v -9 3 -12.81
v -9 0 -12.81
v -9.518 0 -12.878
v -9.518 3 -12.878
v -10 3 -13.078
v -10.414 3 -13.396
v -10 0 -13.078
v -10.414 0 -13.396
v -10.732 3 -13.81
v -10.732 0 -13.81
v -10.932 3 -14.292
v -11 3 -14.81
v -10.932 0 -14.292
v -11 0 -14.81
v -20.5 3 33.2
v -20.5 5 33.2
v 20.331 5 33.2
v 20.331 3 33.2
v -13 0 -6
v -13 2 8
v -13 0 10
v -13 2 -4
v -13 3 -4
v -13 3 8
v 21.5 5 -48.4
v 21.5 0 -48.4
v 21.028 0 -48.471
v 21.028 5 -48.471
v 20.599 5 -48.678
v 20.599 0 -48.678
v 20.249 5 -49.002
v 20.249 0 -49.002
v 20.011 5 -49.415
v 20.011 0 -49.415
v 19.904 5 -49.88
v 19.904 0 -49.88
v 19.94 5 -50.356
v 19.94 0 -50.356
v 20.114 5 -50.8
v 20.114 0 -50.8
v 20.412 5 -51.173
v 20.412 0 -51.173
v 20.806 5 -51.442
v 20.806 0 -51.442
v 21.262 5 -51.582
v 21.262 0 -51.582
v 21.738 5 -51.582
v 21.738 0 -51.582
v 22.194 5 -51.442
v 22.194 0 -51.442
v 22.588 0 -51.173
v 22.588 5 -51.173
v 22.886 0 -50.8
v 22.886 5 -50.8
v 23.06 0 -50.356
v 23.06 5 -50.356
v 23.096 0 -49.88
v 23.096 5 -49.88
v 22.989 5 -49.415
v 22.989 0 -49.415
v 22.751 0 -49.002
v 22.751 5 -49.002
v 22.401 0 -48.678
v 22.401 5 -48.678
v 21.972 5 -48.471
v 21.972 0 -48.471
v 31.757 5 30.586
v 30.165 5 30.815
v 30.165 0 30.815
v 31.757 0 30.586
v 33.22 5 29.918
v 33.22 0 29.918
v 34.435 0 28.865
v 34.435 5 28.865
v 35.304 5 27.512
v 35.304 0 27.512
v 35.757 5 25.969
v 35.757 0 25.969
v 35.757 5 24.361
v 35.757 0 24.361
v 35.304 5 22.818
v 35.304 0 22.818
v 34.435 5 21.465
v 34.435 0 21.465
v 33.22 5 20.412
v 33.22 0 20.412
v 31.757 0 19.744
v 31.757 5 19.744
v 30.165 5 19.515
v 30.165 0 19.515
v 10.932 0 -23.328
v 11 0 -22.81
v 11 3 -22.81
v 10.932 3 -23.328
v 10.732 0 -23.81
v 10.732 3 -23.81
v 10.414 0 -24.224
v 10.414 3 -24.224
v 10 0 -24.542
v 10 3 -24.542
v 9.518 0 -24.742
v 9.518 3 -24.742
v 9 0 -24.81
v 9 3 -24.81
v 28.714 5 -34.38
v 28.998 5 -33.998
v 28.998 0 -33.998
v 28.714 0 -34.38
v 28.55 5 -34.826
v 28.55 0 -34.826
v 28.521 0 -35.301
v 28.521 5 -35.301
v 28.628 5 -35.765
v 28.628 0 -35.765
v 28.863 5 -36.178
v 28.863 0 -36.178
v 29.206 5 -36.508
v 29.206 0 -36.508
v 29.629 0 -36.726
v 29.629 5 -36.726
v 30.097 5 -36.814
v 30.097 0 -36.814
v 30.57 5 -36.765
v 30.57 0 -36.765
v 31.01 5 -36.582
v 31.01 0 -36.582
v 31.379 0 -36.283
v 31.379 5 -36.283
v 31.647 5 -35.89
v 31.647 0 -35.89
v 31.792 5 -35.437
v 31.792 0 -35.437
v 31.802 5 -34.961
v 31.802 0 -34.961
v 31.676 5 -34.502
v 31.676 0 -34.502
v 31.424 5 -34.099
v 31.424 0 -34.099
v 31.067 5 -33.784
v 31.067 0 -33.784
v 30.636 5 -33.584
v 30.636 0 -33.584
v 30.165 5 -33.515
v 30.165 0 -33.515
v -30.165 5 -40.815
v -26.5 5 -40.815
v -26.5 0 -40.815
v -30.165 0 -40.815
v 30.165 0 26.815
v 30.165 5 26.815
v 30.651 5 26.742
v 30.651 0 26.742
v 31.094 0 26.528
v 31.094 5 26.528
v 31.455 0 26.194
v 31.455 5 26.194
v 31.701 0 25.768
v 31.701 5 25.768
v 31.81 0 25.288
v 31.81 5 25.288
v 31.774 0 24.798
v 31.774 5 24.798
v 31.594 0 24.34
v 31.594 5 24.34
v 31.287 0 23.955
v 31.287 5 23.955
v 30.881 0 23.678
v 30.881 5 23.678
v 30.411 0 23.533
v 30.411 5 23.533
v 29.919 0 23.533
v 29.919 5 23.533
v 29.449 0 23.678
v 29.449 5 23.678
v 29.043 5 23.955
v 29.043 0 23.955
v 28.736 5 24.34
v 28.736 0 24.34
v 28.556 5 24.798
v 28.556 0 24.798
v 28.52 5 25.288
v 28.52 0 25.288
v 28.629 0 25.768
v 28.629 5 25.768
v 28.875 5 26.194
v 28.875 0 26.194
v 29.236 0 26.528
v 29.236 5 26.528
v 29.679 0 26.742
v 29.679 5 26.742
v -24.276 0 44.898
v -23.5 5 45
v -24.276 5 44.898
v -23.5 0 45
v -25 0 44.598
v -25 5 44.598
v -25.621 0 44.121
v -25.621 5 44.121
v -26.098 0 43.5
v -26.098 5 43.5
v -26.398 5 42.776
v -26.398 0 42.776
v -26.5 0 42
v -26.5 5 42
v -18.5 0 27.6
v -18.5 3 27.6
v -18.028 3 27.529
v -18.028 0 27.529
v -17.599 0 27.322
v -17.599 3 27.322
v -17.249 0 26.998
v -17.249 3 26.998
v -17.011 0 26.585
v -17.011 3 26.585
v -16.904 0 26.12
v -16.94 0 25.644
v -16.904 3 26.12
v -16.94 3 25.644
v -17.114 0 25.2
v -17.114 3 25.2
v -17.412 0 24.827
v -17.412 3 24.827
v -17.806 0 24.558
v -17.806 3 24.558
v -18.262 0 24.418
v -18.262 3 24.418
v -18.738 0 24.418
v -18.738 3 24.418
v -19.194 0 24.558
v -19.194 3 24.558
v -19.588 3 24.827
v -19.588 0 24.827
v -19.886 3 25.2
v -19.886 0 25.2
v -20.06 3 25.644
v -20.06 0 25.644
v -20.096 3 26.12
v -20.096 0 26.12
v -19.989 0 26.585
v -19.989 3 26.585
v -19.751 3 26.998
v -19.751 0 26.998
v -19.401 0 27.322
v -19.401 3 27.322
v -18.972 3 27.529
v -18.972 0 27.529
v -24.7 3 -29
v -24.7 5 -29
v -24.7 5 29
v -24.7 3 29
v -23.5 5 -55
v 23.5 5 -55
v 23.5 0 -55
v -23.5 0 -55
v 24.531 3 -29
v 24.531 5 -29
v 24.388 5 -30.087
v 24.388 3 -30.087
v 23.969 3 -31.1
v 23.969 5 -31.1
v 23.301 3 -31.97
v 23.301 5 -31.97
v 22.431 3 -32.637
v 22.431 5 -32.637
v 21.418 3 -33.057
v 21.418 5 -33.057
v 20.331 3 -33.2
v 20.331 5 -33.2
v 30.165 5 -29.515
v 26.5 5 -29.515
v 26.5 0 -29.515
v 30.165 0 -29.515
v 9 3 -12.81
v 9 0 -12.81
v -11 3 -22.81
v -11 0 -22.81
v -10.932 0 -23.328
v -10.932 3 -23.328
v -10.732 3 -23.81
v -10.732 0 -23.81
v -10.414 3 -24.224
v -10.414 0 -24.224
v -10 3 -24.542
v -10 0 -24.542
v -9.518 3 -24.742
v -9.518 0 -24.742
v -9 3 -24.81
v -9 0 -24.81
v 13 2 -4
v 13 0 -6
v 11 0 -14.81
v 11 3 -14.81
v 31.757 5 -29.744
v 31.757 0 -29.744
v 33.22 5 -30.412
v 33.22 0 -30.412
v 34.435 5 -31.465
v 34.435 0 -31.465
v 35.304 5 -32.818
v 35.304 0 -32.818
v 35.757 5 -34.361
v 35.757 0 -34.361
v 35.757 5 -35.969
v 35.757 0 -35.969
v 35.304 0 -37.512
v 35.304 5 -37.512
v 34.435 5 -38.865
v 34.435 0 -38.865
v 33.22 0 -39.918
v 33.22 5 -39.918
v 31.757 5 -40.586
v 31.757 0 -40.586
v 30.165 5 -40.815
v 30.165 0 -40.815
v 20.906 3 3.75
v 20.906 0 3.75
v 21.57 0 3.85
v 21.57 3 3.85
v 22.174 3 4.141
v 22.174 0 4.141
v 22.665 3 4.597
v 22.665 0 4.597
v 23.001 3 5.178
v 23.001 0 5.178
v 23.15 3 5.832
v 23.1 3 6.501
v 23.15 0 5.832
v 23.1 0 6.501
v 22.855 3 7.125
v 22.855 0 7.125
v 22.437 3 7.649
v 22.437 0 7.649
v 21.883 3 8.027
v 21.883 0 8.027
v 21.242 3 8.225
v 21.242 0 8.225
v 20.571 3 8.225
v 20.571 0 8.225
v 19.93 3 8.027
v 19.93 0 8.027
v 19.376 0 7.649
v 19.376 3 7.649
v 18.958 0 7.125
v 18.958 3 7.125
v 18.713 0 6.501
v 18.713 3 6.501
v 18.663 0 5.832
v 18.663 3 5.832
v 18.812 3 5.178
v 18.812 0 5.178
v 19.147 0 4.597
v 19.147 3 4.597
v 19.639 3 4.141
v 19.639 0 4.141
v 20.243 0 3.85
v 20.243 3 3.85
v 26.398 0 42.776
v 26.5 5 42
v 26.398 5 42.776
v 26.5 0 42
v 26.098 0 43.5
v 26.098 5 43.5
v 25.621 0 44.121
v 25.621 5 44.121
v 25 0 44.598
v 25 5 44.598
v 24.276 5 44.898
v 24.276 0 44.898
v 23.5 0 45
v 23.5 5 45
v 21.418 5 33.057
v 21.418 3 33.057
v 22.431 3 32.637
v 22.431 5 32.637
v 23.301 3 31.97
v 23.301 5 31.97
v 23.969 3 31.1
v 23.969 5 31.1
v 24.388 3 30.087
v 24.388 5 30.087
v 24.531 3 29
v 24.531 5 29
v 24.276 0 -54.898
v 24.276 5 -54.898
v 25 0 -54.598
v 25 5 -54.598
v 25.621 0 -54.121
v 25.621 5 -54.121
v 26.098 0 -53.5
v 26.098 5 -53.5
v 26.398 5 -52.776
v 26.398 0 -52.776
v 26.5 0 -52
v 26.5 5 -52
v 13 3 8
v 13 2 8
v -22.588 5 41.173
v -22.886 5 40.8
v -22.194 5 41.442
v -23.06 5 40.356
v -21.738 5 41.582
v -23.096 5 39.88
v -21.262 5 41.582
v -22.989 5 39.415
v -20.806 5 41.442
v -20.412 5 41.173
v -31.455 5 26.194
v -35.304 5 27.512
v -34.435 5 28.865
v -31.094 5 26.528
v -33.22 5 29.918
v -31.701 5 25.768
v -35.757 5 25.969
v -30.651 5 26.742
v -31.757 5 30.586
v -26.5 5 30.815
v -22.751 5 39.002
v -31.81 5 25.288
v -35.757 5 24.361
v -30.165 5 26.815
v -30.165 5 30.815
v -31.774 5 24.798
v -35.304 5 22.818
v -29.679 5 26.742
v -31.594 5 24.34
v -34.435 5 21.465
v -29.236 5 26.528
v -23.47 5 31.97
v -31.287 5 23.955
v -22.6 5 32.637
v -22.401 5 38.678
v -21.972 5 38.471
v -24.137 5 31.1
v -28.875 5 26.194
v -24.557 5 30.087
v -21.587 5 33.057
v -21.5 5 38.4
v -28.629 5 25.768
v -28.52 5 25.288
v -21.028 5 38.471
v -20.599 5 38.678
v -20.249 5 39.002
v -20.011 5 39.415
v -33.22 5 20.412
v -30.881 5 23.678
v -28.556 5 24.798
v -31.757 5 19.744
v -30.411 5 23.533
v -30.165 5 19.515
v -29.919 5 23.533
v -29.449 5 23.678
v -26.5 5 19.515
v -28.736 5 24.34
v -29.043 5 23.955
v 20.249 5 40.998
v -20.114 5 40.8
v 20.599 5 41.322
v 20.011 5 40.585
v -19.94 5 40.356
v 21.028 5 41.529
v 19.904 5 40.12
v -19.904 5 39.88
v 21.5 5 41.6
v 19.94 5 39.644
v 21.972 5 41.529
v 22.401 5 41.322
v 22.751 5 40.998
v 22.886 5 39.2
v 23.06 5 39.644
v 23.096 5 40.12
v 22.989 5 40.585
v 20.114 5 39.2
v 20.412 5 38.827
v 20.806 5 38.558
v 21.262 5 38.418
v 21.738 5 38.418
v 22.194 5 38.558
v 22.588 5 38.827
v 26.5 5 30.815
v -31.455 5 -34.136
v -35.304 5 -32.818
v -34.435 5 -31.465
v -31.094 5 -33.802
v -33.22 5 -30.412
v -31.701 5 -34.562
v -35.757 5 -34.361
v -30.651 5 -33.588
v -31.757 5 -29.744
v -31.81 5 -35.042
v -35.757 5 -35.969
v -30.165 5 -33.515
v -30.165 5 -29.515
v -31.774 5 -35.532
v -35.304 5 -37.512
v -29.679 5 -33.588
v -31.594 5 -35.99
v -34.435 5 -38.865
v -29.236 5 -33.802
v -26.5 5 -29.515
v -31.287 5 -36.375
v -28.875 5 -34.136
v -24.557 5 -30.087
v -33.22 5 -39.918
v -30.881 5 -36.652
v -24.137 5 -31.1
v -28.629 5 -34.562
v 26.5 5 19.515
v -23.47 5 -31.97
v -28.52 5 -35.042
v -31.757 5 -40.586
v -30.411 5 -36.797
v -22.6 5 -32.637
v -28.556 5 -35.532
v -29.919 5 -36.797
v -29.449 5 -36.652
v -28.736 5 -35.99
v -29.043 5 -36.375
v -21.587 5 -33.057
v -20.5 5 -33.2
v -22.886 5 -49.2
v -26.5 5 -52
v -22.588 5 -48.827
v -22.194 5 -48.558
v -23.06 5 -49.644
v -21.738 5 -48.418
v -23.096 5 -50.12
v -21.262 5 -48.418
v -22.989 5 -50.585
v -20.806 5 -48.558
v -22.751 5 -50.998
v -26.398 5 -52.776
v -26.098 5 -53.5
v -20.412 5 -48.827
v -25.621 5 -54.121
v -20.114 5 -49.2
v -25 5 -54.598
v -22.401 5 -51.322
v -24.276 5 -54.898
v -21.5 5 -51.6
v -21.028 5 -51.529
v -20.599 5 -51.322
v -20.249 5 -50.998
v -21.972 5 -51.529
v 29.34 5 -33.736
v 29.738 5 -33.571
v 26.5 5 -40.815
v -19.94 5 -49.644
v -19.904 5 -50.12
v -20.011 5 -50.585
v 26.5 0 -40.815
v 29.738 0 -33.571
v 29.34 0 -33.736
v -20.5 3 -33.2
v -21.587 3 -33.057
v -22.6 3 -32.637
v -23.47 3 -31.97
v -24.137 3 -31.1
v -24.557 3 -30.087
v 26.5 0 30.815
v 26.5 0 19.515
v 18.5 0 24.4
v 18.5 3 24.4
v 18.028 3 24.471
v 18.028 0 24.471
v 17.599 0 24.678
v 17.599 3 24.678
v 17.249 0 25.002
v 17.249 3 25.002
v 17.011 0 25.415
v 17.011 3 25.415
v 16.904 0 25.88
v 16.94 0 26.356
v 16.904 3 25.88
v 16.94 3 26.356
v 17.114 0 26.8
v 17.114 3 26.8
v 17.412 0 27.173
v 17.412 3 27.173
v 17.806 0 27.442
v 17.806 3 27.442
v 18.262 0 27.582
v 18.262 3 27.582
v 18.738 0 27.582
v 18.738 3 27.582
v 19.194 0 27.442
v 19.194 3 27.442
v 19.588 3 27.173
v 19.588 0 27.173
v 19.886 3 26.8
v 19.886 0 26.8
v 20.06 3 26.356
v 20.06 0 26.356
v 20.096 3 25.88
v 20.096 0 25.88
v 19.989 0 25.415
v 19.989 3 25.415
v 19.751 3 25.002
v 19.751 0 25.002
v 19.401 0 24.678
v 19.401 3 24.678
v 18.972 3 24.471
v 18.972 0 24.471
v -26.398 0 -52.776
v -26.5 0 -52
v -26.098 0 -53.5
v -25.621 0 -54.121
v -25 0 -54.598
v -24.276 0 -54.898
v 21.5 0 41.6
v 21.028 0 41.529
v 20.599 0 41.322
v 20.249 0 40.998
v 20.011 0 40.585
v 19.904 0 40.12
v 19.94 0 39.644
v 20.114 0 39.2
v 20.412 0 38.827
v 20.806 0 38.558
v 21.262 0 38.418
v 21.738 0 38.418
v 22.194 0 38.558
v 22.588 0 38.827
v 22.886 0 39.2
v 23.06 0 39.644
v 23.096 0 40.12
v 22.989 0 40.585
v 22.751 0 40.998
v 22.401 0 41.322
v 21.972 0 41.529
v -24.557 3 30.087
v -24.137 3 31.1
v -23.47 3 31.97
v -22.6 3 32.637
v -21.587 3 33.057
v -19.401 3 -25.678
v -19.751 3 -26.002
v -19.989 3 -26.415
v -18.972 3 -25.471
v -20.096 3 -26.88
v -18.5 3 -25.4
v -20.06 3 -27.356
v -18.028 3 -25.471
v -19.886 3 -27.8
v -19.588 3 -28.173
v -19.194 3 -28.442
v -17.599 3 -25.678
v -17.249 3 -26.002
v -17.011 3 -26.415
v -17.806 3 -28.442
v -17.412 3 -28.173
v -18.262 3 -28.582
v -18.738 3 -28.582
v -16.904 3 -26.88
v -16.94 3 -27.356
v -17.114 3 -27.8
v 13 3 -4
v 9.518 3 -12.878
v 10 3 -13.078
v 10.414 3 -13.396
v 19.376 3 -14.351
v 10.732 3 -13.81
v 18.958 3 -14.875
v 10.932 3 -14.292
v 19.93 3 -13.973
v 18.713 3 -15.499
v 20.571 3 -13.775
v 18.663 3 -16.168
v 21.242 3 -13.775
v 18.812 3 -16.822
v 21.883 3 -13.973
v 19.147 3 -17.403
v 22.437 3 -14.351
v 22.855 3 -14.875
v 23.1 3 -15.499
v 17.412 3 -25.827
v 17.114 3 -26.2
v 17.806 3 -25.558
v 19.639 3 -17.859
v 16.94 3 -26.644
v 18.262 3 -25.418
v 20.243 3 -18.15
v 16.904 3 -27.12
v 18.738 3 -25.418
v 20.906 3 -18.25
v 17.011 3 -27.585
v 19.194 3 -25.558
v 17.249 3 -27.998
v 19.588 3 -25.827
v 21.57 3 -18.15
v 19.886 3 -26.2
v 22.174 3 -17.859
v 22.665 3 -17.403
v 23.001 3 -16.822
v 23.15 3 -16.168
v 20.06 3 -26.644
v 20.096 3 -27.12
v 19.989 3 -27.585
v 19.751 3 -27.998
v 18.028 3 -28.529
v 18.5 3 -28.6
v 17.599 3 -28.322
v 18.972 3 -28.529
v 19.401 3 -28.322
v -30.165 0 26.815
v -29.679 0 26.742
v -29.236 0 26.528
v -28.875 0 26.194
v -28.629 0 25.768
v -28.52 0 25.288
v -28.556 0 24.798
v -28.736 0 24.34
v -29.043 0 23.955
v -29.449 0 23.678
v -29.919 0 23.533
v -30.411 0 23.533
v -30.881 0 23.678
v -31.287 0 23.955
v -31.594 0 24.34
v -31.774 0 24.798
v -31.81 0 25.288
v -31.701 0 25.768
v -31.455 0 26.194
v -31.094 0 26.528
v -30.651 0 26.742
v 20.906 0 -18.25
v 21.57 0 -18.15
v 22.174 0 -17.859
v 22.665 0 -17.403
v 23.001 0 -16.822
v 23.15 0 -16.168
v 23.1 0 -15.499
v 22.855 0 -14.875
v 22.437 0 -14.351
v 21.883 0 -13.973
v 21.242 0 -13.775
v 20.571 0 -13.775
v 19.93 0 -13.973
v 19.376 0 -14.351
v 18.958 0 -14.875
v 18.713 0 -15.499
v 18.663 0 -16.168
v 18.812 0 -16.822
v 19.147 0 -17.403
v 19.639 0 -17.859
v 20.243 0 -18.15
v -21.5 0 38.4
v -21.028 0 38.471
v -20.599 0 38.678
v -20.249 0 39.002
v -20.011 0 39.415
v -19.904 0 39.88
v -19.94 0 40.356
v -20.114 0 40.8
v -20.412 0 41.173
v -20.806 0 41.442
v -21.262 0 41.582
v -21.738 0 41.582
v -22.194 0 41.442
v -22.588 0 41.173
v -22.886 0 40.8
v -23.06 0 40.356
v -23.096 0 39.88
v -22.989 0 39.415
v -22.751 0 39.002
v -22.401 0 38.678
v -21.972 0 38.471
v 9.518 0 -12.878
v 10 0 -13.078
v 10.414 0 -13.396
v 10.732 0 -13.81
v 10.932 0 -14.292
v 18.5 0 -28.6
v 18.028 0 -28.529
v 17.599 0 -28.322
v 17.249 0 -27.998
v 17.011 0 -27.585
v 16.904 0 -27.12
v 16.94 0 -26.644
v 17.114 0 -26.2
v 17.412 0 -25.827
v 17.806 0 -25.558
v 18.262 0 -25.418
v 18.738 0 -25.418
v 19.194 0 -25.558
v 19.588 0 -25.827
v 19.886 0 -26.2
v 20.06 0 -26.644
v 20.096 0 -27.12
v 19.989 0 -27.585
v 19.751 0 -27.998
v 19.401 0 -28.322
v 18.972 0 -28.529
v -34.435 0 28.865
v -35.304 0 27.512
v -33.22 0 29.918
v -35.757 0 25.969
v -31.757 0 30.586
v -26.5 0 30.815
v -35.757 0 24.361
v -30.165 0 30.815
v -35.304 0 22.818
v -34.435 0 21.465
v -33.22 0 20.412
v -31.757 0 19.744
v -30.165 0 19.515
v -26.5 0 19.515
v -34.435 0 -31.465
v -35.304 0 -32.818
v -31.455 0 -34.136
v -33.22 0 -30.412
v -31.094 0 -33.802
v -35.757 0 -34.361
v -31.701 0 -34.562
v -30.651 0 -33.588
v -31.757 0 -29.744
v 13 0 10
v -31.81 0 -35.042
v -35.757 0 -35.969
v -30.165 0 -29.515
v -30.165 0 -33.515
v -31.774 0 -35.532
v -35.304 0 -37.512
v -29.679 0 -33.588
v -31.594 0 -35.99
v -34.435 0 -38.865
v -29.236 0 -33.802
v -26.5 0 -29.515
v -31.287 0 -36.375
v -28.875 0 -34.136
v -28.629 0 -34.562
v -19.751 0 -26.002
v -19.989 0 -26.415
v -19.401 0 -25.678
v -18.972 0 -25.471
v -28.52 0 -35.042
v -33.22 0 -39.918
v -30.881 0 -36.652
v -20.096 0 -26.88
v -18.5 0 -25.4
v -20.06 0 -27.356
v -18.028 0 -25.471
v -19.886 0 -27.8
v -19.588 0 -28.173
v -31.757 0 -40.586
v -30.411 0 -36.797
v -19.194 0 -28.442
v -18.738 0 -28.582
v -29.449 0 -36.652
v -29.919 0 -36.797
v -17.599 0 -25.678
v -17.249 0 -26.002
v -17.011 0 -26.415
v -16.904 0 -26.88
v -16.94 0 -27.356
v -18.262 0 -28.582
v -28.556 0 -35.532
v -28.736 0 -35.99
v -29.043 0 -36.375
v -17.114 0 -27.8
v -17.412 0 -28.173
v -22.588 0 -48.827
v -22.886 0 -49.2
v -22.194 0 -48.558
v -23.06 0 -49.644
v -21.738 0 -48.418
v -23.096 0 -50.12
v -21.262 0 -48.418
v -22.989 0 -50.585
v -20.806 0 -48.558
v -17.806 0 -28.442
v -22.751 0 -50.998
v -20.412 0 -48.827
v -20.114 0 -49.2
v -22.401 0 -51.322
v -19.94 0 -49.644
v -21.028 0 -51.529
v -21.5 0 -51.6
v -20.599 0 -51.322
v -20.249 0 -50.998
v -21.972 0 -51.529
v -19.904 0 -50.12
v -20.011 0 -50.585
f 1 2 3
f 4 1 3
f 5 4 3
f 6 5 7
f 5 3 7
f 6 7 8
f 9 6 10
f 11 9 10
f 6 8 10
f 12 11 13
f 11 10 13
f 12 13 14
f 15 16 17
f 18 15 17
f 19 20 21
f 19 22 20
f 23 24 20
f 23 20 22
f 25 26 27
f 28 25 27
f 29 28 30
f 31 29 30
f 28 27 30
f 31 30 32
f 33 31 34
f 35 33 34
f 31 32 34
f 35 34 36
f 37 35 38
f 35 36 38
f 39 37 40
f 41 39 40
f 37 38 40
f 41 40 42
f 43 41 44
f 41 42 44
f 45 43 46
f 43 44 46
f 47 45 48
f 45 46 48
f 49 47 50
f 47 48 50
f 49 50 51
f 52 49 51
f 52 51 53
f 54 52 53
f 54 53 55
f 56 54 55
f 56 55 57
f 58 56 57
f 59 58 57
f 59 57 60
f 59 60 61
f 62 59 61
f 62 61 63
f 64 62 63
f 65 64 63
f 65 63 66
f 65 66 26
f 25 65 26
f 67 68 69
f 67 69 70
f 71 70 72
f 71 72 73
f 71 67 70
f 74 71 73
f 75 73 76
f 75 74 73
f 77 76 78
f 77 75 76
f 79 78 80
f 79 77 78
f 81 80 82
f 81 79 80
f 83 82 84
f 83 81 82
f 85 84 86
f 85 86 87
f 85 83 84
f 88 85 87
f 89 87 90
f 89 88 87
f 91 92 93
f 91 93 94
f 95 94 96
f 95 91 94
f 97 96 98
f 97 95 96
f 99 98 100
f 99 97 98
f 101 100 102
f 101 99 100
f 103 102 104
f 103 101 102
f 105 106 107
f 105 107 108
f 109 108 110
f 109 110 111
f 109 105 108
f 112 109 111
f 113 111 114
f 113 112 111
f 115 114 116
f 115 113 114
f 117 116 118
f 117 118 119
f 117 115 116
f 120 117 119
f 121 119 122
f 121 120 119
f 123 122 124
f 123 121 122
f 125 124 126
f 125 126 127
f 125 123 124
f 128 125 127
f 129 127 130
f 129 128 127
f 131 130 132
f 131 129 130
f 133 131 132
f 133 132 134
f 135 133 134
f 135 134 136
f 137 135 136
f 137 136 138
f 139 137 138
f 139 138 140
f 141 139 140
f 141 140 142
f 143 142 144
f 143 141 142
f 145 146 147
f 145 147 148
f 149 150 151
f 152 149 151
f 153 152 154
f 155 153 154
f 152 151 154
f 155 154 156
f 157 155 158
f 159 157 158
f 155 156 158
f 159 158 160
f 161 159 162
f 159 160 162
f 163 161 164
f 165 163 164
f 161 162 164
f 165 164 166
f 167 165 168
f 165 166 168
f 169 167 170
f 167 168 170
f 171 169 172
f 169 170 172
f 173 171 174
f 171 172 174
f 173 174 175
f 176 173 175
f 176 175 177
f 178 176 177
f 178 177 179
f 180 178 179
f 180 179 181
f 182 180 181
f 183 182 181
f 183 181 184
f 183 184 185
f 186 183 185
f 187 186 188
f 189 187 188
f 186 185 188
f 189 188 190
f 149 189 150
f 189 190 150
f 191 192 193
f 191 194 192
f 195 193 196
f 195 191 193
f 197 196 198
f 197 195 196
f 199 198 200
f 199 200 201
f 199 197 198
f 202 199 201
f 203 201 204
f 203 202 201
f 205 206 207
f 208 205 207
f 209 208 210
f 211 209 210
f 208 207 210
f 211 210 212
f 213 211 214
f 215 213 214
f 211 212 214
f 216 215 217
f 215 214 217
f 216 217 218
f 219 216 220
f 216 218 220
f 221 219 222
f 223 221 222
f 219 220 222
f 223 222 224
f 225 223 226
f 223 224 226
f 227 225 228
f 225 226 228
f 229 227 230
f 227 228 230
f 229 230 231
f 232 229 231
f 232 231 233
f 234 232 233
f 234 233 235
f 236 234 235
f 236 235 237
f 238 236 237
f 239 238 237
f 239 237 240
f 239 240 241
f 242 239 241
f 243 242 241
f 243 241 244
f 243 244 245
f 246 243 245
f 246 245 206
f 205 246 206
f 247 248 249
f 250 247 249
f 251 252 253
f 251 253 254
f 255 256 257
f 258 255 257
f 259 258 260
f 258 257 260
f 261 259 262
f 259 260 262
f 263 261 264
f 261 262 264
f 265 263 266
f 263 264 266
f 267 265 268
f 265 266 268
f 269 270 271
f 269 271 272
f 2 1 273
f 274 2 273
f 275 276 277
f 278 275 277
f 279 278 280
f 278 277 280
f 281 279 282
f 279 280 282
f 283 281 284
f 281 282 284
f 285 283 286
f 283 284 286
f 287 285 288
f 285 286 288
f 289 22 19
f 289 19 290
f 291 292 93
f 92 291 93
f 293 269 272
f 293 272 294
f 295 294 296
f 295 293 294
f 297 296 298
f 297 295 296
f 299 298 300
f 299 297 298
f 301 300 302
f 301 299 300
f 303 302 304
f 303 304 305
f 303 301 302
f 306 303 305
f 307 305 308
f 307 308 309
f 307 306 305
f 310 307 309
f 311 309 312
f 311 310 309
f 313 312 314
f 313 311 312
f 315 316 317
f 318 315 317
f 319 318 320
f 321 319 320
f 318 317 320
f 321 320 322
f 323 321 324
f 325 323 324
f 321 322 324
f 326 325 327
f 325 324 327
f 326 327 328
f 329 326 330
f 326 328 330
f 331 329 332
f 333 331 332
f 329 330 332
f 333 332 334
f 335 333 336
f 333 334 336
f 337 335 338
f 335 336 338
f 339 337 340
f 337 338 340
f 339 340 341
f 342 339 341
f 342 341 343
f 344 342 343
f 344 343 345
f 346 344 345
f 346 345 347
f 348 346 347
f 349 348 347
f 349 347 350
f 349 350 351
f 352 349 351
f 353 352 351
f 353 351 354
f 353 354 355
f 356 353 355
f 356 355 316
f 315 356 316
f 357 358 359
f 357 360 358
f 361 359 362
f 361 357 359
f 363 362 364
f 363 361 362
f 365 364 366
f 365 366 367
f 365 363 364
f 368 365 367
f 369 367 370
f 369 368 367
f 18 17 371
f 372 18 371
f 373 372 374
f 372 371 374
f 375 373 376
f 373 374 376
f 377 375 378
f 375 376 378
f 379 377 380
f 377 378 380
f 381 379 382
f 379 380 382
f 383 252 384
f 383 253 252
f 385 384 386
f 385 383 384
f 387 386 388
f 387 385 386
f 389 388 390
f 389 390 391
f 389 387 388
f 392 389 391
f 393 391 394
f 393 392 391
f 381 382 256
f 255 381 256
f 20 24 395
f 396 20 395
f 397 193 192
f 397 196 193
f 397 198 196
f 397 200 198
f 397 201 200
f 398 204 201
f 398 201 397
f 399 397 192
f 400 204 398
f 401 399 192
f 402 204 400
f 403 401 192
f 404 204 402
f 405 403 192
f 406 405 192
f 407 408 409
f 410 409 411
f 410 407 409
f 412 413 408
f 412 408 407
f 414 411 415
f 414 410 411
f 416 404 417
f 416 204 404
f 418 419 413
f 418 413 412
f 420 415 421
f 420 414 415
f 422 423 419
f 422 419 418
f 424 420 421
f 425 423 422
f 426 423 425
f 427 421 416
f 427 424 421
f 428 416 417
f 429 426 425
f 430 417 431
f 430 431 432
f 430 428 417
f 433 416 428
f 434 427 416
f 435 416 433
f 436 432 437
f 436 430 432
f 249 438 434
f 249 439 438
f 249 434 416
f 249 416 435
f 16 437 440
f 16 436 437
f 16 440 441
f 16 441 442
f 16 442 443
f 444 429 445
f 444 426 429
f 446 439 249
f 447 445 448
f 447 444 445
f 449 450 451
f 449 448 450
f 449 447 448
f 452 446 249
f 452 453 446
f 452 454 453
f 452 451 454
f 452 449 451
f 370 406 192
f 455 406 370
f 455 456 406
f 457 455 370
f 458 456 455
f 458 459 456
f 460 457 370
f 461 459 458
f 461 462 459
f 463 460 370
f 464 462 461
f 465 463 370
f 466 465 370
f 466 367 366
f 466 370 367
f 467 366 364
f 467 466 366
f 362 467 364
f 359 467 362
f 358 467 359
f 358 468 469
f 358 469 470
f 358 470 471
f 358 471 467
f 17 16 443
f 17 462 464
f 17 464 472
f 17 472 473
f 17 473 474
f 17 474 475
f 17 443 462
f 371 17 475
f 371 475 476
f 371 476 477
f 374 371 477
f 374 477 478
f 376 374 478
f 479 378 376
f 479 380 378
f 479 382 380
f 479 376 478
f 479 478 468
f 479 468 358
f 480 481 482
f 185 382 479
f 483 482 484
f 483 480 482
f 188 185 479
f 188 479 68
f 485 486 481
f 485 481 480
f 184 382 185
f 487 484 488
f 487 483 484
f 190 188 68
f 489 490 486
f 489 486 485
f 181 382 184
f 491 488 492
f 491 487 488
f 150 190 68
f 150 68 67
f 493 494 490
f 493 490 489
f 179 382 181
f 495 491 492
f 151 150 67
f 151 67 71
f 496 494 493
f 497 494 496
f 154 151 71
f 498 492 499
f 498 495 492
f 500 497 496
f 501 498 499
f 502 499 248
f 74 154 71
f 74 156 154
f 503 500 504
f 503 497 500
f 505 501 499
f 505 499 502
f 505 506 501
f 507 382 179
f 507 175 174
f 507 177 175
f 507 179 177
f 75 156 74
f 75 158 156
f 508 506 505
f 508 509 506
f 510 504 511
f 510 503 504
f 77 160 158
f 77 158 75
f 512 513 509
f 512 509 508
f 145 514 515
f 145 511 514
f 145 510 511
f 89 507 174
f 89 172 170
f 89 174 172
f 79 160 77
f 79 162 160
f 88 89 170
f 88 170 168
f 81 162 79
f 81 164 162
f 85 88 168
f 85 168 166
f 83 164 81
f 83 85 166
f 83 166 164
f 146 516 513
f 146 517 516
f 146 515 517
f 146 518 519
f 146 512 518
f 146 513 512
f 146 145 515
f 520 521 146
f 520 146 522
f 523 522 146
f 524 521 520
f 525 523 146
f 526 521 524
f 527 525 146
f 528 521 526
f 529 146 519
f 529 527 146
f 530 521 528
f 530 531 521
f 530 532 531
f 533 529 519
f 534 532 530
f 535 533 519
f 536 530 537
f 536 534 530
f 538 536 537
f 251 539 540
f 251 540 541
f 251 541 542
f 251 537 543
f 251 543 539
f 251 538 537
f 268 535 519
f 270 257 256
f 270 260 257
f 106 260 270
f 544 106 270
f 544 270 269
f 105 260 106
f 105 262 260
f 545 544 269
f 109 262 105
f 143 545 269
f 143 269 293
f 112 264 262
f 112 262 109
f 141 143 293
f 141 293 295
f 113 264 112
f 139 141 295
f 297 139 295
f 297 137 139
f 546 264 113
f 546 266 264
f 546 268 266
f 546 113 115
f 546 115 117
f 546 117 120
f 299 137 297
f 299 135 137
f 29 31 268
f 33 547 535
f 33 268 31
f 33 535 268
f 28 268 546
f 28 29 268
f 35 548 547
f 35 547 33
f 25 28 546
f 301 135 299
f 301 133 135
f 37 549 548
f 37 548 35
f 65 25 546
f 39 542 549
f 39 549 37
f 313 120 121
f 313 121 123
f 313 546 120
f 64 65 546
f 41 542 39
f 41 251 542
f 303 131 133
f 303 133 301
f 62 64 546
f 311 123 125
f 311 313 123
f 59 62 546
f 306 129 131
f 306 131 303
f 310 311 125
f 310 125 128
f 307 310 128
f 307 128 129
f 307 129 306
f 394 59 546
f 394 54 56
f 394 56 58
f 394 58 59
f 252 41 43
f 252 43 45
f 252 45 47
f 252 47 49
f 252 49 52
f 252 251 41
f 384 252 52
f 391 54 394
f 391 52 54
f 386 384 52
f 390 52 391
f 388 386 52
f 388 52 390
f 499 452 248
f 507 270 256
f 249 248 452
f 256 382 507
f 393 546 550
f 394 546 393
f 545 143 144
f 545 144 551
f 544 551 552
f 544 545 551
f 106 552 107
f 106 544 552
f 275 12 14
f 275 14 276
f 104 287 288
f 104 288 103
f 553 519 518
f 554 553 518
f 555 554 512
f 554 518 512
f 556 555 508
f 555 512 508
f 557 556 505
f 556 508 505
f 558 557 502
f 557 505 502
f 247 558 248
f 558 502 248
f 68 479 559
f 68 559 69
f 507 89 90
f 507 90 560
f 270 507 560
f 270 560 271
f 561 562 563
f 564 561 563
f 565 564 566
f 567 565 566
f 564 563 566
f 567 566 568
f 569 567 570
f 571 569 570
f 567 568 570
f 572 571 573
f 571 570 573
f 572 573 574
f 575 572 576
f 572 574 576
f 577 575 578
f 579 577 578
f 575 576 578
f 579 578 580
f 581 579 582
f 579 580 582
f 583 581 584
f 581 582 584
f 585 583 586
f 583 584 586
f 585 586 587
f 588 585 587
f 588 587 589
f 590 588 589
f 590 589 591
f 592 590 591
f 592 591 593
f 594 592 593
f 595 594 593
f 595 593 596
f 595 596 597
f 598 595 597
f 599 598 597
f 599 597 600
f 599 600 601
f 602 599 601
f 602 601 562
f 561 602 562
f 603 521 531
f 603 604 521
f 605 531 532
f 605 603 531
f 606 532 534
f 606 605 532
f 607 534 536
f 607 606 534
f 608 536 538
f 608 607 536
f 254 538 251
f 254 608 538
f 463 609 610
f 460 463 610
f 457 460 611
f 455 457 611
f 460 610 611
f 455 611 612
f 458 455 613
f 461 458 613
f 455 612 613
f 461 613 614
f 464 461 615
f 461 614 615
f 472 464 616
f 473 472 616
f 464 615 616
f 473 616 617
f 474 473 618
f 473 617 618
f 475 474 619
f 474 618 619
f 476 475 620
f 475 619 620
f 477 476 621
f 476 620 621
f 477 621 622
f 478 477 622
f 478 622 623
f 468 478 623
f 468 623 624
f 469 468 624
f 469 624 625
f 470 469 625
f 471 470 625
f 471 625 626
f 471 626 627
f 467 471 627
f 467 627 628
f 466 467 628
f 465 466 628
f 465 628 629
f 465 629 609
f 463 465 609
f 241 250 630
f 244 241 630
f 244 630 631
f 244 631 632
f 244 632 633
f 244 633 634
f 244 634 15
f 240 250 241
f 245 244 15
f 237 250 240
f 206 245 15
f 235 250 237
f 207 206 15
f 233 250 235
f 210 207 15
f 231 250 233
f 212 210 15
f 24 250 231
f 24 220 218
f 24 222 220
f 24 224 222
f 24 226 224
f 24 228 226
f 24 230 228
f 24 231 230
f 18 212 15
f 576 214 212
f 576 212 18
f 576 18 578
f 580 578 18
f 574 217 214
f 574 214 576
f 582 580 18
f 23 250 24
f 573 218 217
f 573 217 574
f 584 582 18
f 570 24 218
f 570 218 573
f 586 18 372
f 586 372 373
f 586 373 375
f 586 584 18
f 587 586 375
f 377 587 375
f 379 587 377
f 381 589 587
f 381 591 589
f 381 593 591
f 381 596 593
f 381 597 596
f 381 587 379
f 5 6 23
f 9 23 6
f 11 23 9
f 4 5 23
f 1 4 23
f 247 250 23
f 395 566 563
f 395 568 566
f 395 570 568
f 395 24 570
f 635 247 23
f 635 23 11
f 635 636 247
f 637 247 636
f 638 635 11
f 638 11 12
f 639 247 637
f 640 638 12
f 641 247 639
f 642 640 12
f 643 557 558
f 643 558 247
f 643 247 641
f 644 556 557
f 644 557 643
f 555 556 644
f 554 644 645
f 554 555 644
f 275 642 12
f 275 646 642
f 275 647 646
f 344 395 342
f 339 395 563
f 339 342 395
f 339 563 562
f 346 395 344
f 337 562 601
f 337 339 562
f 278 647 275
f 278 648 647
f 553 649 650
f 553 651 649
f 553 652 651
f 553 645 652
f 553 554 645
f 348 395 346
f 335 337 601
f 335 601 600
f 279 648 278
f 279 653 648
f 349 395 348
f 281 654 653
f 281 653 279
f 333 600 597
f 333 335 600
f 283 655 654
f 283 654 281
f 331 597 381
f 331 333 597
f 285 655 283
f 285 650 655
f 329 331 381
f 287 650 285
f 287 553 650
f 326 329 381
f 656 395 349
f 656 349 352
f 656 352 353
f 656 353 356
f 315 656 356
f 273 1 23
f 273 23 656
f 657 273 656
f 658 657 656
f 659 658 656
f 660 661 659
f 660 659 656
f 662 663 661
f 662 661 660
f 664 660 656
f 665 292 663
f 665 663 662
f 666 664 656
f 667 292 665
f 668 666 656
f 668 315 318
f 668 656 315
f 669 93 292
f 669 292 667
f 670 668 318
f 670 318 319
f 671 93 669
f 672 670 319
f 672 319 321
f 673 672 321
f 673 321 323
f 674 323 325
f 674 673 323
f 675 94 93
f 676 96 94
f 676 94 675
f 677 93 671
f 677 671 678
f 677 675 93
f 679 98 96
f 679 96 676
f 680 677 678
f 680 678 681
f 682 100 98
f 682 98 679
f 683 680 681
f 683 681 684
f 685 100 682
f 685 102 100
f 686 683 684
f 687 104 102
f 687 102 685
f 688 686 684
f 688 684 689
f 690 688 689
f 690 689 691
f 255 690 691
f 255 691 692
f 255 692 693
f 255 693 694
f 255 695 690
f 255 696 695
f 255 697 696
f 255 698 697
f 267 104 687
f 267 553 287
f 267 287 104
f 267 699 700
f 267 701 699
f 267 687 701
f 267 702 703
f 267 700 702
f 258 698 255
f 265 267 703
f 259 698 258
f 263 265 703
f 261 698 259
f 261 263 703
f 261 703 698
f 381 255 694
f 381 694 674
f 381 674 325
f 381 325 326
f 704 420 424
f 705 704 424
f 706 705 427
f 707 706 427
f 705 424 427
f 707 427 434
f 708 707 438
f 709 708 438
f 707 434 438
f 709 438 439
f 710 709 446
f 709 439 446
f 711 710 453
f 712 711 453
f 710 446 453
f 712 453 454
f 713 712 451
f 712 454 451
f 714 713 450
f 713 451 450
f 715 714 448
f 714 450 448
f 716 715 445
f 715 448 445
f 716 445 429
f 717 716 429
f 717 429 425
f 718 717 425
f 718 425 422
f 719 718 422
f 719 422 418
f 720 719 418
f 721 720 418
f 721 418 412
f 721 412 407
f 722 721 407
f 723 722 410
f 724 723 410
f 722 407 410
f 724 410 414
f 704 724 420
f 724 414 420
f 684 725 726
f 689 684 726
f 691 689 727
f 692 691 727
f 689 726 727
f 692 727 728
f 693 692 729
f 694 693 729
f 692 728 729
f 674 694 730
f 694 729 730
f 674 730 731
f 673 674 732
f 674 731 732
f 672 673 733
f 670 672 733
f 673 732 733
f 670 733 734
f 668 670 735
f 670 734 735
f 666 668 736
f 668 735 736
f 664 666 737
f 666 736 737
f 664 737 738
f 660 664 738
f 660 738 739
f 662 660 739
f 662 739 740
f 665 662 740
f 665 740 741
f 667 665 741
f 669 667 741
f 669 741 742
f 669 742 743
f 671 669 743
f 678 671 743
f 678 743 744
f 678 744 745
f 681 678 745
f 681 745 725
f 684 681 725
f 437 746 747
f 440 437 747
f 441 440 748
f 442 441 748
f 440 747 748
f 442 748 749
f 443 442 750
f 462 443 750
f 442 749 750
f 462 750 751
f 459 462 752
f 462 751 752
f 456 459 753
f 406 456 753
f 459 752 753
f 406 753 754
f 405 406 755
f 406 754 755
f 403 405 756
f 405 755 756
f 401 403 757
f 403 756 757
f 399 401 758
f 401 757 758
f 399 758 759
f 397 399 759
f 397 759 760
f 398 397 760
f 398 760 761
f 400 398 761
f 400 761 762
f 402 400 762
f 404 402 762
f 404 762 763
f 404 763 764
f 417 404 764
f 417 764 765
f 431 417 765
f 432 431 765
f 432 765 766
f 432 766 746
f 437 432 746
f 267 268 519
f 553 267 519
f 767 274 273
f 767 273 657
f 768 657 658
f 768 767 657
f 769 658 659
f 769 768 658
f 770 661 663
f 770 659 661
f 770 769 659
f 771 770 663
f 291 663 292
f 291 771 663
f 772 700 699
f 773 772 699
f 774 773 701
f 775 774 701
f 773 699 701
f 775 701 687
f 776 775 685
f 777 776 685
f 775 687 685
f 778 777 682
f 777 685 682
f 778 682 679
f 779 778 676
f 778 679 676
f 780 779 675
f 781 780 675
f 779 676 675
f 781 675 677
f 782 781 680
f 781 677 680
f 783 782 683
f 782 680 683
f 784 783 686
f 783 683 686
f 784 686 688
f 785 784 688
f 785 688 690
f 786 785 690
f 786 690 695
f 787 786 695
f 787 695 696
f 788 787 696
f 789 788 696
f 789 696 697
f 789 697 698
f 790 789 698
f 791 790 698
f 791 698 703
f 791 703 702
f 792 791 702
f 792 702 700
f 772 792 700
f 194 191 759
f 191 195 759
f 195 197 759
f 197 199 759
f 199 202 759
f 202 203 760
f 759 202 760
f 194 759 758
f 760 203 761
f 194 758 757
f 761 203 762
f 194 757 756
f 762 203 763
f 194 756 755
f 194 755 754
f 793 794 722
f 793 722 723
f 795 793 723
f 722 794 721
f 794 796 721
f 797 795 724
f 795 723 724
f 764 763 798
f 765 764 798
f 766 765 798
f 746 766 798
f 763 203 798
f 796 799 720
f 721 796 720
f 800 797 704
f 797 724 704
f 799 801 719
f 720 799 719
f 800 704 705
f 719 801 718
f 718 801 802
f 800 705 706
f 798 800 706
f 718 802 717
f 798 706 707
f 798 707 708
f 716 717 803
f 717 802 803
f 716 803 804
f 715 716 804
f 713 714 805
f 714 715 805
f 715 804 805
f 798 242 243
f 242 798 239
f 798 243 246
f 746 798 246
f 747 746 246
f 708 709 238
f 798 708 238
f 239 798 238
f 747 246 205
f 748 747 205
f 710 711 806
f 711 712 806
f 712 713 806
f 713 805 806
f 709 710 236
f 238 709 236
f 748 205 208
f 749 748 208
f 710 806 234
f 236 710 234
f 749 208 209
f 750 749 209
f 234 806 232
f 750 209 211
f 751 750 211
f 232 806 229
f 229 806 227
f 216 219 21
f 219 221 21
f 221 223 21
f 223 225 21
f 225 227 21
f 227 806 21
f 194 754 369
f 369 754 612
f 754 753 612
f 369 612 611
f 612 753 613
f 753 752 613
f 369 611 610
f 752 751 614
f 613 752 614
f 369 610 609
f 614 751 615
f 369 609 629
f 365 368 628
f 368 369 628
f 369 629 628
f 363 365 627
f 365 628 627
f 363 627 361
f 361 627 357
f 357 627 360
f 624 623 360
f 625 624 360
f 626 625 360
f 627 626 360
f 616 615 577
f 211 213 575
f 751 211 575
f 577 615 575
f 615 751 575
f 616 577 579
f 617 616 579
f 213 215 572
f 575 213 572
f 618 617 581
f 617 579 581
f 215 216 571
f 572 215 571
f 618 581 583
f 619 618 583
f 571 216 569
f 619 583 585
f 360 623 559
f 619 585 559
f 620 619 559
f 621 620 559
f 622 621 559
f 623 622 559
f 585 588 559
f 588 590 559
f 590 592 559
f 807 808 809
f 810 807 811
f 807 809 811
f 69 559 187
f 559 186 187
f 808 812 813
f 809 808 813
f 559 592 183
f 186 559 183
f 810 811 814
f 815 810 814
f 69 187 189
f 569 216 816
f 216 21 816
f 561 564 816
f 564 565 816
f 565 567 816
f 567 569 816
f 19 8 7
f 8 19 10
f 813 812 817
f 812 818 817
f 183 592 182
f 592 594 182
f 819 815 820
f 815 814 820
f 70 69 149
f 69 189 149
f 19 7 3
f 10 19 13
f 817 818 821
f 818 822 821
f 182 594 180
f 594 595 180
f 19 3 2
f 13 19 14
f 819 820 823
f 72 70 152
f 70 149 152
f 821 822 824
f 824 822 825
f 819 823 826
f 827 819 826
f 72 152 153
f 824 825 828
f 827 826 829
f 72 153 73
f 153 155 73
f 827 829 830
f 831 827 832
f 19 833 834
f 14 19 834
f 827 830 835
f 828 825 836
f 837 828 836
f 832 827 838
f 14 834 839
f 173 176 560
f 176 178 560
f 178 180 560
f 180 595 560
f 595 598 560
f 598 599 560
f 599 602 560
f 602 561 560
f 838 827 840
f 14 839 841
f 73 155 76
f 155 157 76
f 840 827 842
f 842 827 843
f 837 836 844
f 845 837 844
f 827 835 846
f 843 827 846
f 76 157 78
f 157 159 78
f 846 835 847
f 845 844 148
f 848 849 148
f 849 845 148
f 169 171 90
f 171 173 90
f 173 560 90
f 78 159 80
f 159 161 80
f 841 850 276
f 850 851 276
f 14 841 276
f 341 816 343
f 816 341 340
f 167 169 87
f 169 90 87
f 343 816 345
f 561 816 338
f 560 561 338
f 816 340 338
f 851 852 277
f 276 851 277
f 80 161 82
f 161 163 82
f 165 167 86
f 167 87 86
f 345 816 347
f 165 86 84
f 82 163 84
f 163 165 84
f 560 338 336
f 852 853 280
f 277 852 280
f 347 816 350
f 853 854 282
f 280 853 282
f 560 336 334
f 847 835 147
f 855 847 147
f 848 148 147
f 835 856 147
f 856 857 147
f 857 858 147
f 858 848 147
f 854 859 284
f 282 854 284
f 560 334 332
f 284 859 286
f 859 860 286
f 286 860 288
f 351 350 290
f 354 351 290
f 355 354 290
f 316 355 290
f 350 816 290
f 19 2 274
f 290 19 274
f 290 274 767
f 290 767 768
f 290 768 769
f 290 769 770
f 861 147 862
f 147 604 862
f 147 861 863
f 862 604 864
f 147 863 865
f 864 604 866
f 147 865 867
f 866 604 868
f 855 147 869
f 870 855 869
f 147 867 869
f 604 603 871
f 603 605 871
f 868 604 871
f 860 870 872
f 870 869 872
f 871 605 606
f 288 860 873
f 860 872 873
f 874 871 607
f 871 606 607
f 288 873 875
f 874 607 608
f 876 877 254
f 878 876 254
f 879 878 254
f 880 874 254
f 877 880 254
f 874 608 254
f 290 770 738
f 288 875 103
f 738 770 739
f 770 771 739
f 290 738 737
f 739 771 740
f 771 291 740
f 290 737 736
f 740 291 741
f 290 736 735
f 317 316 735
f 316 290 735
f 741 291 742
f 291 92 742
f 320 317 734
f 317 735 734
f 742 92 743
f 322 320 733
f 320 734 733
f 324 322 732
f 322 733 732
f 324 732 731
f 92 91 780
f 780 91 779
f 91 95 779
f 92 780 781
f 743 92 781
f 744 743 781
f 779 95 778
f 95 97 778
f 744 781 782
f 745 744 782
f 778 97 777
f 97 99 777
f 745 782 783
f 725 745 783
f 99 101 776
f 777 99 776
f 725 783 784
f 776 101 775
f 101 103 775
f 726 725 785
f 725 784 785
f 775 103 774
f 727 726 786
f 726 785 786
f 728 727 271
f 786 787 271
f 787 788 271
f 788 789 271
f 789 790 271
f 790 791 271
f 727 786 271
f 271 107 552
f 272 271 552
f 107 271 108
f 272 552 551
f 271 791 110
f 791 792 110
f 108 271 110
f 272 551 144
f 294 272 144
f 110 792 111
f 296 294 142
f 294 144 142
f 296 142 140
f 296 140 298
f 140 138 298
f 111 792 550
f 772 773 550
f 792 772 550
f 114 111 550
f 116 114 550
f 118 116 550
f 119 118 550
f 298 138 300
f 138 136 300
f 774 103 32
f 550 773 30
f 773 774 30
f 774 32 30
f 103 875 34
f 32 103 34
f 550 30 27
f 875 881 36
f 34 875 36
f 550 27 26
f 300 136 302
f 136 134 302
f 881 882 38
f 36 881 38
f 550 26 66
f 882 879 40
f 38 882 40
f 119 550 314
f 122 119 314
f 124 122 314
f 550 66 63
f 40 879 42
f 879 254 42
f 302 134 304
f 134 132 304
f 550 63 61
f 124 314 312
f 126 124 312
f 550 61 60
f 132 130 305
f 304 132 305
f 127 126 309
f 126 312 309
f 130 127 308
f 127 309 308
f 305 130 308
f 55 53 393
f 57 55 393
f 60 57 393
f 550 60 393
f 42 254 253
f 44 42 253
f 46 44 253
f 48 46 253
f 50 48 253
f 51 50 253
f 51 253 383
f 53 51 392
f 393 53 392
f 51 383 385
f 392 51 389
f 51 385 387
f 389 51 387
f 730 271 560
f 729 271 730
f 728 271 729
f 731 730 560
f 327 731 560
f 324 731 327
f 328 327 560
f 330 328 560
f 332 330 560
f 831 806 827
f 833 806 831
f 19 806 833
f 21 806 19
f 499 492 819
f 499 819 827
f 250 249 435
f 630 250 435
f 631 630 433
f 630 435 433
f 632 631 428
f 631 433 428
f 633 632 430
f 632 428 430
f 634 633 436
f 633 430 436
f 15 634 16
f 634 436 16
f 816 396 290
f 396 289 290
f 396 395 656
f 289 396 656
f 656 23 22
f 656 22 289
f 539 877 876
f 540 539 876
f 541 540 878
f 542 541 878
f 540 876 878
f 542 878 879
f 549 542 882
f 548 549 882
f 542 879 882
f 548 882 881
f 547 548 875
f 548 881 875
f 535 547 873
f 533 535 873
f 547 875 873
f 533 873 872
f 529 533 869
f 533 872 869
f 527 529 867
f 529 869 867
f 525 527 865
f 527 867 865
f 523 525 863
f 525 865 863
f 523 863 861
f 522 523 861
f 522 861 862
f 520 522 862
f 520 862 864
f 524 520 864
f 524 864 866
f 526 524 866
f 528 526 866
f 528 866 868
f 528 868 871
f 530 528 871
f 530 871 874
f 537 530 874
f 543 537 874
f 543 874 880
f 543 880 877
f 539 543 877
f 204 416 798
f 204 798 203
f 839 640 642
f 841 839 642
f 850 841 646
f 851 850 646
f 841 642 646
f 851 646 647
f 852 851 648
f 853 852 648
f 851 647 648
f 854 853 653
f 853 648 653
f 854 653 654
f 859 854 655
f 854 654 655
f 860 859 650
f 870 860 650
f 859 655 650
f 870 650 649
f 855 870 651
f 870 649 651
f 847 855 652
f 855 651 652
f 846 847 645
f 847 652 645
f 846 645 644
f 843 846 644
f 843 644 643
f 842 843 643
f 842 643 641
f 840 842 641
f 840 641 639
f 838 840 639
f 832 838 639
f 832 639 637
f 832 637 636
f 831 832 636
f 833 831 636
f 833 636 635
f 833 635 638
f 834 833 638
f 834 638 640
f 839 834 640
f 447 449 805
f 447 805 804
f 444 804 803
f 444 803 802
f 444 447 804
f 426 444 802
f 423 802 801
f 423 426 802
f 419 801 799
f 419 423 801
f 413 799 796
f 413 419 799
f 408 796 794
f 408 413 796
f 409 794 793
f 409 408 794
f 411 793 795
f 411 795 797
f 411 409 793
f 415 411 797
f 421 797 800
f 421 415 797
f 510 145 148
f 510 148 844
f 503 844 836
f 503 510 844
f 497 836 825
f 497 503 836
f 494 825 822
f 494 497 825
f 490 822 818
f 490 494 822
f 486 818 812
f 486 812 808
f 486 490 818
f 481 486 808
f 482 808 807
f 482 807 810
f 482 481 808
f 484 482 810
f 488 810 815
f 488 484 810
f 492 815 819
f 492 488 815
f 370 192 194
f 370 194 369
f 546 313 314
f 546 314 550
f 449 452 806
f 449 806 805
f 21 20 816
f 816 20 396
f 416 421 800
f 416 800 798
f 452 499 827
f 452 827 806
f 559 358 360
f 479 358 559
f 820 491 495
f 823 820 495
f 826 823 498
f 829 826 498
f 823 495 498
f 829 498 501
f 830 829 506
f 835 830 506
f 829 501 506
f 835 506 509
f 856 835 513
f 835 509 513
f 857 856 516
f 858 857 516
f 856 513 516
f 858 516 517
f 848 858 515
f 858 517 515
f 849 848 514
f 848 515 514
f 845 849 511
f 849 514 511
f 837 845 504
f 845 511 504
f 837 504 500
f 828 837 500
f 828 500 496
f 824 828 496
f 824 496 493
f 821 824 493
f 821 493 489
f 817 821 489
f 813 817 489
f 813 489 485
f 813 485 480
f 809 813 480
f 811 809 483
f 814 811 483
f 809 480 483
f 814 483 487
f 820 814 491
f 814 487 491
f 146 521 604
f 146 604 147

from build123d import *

# Parameters (mm, degrees)
SKETCH1_W           = 47
SKETCH1_H           = 64
BOSS_EXTRUDE1_DEPTH = 5
SKETCH2_W           = 22
SKETCH2_H           = 12
SKETCH2_W_2         = 26
CUT_EXTRUDE1_DEPTH  = 5
SKETCH3_R           = 1.6
CUT_EXTRUDE2_DEPTH  = 63
FILLET1_R           = 2
FILLET2_R           = 3
SKETCH5_R           = 1.65
BOSS_EXTRUDE3_DEPTH = 5
CUT_EXTRUDE5_DEPTH  = 2
SKETCH7_R           = 1.6
CUT_EXTRUDE7_DEPTH  = 66.823356227
CHAMFER4_SIZE       = 2
FILLET3_R           = 3
SKETCH8_R           = 2.25
CUT_EXTRUDE8_DEPTH  = 66.823356227


with BuildPart() as part:
    # Sketch1 → Boss-Extrude1 (new body)
    with BuildSketch(Plane(origin=(0, 0, 0), x_dir=(1, 0, 0), z_dir=(0, 1, 0))):
        Rectangle(SKETCH1_W, SKETCH1_H)
    extrude(amount=BOSS_EXTRUDE1_DEPTH)

    # Sketch2 → Cut-Extrude1 (cut)
    with BuildSketch(Plane(origin=(0, 5, 0), x_dir=(1, 0, 0), z_dir=(0, 1, 0))):
        with Locations((0, 18.81)):
            Rectangle(SKETCH2_W, SKETCH2_H)
        with Locations((0, -2)):
            Rectangle(SKETCH2_W_2, SKETCH2_H)
    extrude(amount=-CUT_EXTRUDE1_DEPTH, mode=Mode.SUBTRACT)

    # Sketch3 → Cut-Extrude2 (cut)
    with BuildSketch(Plane(origin=(0, 5, 0), x_dir=(1, 0, 0), z_dir=(0, 1, 0))):
        with Locations(Location((-18.5, 27, 0), (0, 0, 270))):
            Circle(SKETCH3_R)
        with Locations(Location((18.5, 27, 0), (0, 0, 90))):
            Circle(SKETCH3_R)
        with Locations(Location((-18.5, -26, 0), (0, 0, 270))):
            Circle(SKETCH3_R)
        with Locations(Location((18.5, -26, 0), (0, 0, 90))):
            Circle(SKETCH3_R)
    extrude(amount=-CUT_EXTRUDE2_DEPTH, mode=Mode.SUBTRACT)

    # Fillet1
    fillet1_edges = [part.edges().sort_by_distance(p)[0] for p in [
        (11, 2.5, -12.81),
        (-11, 2.5, -12.81),
        (-11, 2.5, -24.81),
        (11, 2.5, -24.81),
    ]]
    fillet(fillet1_edges, radius=FILLET1_R)

    # Fillet2
    fillet2_edges = [part.edges().sort_by_distance(p)[0] for p in [
        (23.5, 2.5, -32),
        (23.5, 2.5, 32),
        (-23.5, 2.5, 32),
        (-23.5, 2.5, -32),
    ]]
    fillet(fillet2_edges, radius=FILLET2_R)

    # Sketch5 → Boss-Extrude3 (add)
    with BuildSketch(Plane(origin=(0, 5, 0), x_dir=(1, 0, 0), z_dir=(0, 1, 0))):
        with BuildLine():
            ThreePointArc((-30.165, 40.815), (-35.815, 35.165), (-30.165, 29.515))
            Line((-30.165, 29.515), (-26.5, 29.515))
            Line((-26.5, 29.515), (-26.5, -19.515))
            Line((-26.5, -19.515), (-30.165, -19.515))
            ThreePointArc((-30.165, -19.515), (-35.815, -25.165), (-30.165, -30.815))
            Line((-30.165, -30.815), (-26.5, -30.815))
            Line((-26.5, -30.815), (-26.5, -45))
            Line((-26.5, -45), (26.5, -45))
            Line((26.5, -45), (26.5, -30.815))
            Line((26.5, -30.815), (30.165, -30.815))
            ThreePointArc((30.165, -30.815), (35.815, -25.165), (30.165, -19.515))
            Line((30.165, -19.515), (26.5, -19.515))
            Line((26.5, -19.515), (26.5, 29.515))
            Line((26.5, 29.515), (30.165, 29.515))
            ThreePointArc((30.165, 29.515), (35.815, 35.165), (30.165, 40.815))
            Line((30.165, 40.815), (26.5, 40.815))
            Line((26.5, 40.815), (26.5, 55))
            Line((26.5, 55), (-26.5, 55))
            Line((-26.5, 55), (-26.5, 40.815))
            Line((-26.5, 40.815), (-30.165, 40.815))
        make_face()
        with Locations(Location((-30.165, -25.165, 0), (0, 0, 270))):
            Circle(SKETCH5_R, mode=Mode.SUBTRACT)
        with BuildLine():
            ThreePointArc((-20.5, -32), (-22.621320344, -31.121320344), (-23.5, -29))
            Line((-23.5, -29), (-23.5, 29))
            ThreePointArc((-23.5, 29), (-22.621320344, 31.121320344), (-20.5, 32))
            Line((-20.5, 32), (20.5, 32))
            ThreePointArc((20.5, 32), (22.621320344, 31.121320344), (23.5, 29))
            Line((23.5, 29), (23.5, -25.165))
            Line((23.5, -25.165), (23.5, -29))
            ThreePointArc((23.5, -29), (22.621320344, -31.121320344), (20.5, -32))
            Line((20.5, -32), (-20.5, -32))
        make_face(mode=Mode.SUBTRACT)
        with Locations(Location((30.165, -25.165, 0), (0, 0, 270))):
            Circle(SKETCH5_R, mode=Mode.SUBTRACT)
        with Locations(Location((-30.165, 35.165, 0), (0, 0, 270))):
            Circle(SKETCH5_R, mode=Mode.SUBTRACT)
        with BuildLine():
            ThreePointArc((28.998273811, 33.998273811), (30.796427663, 36.689401229), (30.165, 33.515))
            ThreePointArc((30.165, 33.515), (29.533572337, 33.640598771), (28.998273811, 33.998273811))
        make_face(mode=Mode.SUBTRACT)
    extrude(amount=-BOSS_EXTRUDE3_DEPTH)

    # Sketch6 → Cut-Extrude5 (cut)
    with BuildSketch(Plane(origin=(0, 5, 0), x_dir=(1, 0, 0), z_dir=(0, 1, 0))):
        with BuildLine():
            Line((-24.7, 29), (-24.7, -29))
            ThreePointArc((-24.7, -29), (-23.469848481, -31.969848481), (-20.5, -33.2))
            Line((-20.5, -33.2), (20.331389121, -33.2))
            ThreePointArc((20.331389121, -33.2), (23.301237602, -31.969848481), (24.531389121, -29))
            Line((24.531389121, -29), (24.531389121, 29))
            ThreePointArc((24.531389121, 29), (23.301237602, 31.969848481), (20.331389121, 33.2))
            Line((20.331389121, 33.2), (-20.5, 33.2))
            ThreePointArc((-20.5, 33.2), (-23.469848481, 31.969848481), (-24.7, 29))
        make_face()
    extrude(amount=-CUT_EXTRUDE5_DEPTH, mode=Mode.SUBTRACT)

    # Sketch7 → Cut-Extrude7 (cut, through all)
    with BuildSketch(Plane.XZ):
        with Locations(Location((-21.5, 40, 0), (0, 0, 270))):
            Circle(SKETCH7_R)
        with Locations(Location((21.5, 40, 0), (0, 0, 90))):
            Circle(SKETCH7_R)
        with Locations(Location((-21.5, -50, 0), (0, 0, 270))):
            Circle(SKETCH7_R)
        with Locations(Location((21.5, -50, 0), (0, 0, 90))):
            Circle(SKETCH7_R)
    extrude(amount=-CUT_EXTRUDE7_DEPTH, mode=Mode.SUBTRACT)

    # Chamfer4
    chamfer4_edges = [part.edges().sort_by_distance(p)[0] for p in [
        (0, 0, -4),
        (0, 0, 8),
    ]]
    chamfer(chamfer4_edges, length=CHAMFER4_SIZE)

    # Fillet3
    fillet3_edges = [part.edges().sort_by_distance(p)[0] for p in [
        (26.5, 2.5, -55),
        (-26.5, 2.5, -55),
        (-26.5, 2.5, 45),
        (26.5, 2.5, 45),
    ]]
    fillet(fillet3_edges, radius=FILLET3_R)

    # Sketch8 → Cut-Extrude8 (cut, through all)
    with BuildSketch(Plane.XZ):
        with Locations(Location((20.90630532, -16, 0), (0, 0, 270))):
            Circle(SKETCH8_R)
        with Locations(Location((20.90630532, 6, 0), (0, 0, 270))):
            Circle(SKETCH8_R)
    extrude(amount=-CUT_EXTRUDE8_DEPTH, mode=Mode.SUBTRACT)


solid = part.part
